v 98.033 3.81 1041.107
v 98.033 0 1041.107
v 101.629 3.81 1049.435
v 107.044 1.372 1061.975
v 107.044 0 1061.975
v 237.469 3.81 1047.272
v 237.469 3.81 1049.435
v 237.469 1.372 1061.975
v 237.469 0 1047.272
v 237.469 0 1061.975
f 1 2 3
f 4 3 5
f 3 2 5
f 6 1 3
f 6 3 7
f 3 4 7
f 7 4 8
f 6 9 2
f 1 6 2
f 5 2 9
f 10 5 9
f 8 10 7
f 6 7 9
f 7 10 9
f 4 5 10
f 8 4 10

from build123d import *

# Parameters (mm, degrees)
BOSS_EXTRUDE1_DEPTH = 3.81
CHAMFER1_SIZE       = 12.54
CHAMFER1_SIZE2      = 2.437529077


with BuildPart() as part:
    # Sketch2 → Boss-Extrude1 (new body)
    with BuildSketch(Plane(origin=(0, 0, 0), x_dir=(1, 0, 0), z_dir=(0, 1, 0))):
        Polygon((98.033263401, -1041.106556332), (107.044429893, -1061.974520841), (237.469208074, -1061.974520841), (237.469208074, -1047.272091301), align=None)
    extrude(amount=BOSS_EXTRUDE1_DEPTH)

    # Chamfer1
    chamfer1_edges = [part.edges().sort_by_distance(p)[0] for p in [
        (172.256818983, 3.81, 1061.974520841),
    ]]
    chamfer1_side = [part.faces().sort_by_distance(p)[0] for p in [
        (166.193416202, 3.81, 1052.913037199),
    ]]
    chamfer(chamfer1_edges, length=CHAMFER1_SIZE, length2=CHAMFER1_SIZE2, reference=chamfer1_side[0])


solid = part.part
